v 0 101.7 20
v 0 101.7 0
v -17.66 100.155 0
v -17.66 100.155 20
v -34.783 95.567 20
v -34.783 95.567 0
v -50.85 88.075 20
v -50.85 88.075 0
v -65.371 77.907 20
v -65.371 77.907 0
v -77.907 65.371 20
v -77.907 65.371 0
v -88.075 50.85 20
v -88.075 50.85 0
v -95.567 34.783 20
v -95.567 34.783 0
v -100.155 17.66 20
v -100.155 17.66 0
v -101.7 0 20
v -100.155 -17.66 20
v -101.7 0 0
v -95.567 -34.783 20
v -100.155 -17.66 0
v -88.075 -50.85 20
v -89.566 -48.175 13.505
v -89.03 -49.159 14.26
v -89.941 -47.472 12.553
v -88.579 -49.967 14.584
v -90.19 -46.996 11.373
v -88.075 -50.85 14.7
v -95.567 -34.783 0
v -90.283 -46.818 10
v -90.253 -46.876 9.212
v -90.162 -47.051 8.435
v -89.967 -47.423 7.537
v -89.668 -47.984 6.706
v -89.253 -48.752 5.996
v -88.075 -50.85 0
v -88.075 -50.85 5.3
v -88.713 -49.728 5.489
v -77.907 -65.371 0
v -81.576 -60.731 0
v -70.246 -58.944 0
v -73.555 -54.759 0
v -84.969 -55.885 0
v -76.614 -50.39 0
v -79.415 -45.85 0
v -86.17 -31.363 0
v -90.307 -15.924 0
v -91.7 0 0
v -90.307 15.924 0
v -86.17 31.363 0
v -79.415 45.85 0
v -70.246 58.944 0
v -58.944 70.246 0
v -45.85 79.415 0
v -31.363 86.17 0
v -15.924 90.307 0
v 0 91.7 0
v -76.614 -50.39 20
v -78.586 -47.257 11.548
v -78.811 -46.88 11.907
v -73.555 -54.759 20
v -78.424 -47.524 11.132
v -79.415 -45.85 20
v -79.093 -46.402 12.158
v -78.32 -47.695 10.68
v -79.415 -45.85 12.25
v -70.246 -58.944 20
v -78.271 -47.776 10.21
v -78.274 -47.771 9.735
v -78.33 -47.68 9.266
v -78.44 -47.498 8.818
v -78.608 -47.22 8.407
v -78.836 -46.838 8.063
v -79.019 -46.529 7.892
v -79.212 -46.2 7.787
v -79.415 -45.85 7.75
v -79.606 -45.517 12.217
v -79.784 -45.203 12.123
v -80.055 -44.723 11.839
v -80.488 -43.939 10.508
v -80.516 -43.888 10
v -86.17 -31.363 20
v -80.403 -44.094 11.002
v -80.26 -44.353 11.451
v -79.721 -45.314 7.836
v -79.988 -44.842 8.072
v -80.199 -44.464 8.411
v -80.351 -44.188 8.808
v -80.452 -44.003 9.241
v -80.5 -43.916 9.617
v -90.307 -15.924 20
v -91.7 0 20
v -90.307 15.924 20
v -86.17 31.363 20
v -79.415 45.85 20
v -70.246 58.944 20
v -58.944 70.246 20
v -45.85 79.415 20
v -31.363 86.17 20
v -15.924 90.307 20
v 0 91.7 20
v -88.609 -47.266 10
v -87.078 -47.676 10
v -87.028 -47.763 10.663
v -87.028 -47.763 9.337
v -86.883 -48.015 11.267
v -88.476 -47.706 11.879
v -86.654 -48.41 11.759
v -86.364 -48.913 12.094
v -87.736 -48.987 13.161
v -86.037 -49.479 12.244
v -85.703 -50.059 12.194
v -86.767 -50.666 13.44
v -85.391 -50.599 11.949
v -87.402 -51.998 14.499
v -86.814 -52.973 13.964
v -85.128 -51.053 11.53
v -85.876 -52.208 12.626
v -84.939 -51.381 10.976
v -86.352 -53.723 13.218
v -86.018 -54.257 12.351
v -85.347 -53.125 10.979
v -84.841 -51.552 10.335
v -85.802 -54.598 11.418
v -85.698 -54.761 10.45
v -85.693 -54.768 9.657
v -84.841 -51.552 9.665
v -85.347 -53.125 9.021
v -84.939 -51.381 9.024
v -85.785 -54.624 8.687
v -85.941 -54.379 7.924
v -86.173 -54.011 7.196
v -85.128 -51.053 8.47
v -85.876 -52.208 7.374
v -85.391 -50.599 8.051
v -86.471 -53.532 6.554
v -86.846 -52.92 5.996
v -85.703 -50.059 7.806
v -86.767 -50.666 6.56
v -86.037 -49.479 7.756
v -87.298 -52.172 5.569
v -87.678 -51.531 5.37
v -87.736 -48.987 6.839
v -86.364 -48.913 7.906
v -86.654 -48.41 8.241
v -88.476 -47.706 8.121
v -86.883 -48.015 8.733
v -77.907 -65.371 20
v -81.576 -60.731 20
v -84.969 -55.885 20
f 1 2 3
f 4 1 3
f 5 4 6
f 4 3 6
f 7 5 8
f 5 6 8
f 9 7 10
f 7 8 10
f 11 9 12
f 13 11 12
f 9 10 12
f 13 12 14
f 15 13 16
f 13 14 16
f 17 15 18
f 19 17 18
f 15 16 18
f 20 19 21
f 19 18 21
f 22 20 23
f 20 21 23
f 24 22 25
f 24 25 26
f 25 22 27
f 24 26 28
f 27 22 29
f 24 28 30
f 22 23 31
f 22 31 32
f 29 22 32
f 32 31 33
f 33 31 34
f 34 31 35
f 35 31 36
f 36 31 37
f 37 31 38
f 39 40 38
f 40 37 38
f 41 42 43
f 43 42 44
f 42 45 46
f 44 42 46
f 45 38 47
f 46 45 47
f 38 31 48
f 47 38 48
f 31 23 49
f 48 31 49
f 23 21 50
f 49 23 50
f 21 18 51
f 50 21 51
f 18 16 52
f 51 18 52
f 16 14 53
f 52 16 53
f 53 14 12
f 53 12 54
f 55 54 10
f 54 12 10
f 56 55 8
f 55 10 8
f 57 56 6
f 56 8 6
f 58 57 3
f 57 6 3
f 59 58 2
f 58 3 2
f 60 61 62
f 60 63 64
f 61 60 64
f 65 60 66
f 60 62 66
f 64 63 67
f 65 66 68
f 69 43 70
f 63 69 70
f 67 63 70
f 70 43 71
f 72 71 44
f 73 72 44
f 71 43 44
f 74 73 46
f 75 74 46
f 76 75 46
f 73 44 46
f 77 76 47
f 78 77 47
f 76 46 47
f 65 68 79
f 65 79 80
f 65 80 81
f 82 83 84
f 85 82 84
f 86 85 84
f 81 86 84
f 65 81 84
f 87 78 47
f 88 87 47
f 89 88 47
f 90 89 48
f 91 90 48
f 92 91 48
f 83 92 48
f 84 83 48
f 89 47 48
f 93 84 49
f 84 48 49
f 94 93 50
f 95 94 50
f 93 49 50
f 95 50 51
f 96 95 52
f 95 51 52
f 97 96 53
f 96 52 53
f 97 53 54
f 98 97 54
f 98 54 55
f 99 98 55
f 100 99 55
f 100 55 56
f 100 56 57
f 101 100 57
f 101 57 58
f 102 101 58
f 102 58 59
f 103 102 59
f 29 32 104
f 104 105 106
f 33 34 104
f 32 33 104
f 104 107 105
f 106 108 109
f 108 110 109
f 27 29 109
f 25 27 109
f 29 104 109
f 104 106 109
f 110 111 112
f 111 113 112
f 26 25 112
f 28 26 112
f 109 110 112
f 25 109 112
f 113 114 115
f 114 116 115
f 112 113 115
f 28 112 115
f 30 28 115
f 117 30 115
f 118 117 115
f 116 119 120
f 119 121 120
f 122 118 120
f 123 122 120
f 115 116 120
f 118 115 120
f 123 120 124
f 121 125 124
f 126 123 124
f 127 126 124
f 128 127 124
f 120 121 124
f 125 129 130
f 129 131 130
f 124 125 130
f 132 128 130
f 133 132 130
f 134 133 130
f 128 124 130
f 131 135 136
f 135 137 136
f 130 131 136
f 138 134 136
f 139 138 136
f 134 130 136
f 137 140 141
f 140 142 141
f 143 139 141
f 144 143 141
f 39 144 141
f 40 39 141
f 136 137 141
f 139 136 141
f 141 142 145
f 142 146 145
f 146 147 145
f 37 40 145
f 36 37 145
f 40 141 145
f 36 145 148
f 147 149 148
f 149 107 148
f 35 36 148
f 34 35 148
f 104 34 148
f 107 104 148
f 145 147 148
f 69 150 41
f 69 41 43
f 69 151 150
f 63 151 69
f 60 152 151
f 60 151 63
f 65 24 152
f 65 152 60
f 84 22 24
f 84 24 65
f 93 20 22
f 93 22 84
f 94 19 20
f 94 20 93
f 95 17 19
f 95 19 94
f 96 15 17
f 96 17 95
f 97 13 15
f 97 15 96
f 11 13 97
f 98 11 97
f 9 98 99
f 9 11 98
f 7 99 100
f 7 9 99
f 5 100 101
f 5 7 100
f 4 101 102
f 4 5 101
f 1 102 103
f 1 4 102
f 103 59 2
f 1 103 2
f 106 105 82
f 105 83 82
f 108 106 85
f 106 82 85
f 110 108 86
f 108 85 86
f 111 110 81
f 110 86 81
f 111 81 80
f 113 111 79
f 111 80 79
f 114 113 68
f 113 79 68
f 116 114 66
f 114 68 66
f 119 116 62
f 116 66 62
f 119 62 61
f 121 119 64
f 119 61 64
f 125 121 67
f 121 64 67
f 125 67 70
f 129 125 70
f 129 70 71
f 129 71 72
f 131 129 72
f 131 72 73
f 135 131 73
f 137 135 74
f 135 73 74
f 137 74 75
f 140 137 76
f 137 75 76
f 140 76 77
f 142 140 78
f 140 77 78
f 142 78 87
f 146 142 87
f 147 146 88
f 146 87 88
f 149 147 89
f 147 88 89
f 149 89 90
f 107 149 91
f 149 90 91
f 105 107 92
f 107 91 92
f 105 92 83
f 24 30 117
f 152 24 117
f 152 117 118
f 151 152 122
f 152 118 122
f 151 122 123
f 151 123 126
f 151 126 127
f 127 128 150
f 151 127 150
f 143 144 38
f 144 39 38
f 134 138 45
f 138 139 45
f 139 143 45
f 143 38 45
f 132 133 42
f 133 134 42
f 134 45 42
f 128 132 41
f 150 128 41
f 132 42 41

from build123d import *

# Parameters (mm, degrees)
ESTRUSIONE_ESTRUSIONE1_DEPTH           = 20
FORO_SVASATO_PER_VITE_M4_1_D           = 4.5
FORO_SVASATO_PER_VITE_M4_1_DEPTH       = 30
FORO_SVASATO_PER_VITE_M4_1_CSINK_D     = 9.4
FORO_SVASATO_PER_VITE_M4_1_CSINK_ANGLE = 90
FORO_SVASATO_PER_VITE_M4_1_TIP         = 1.351936393


with BuildPart() as part:
    # Schizzo1 → Estrusione-Estrusione1 (new body)
    with BuildSketch(Plane.XY):
        with BuildLine():
            Line((-88.074783565, -50.85), (-79.414529527, -45.85))
            ThreePointArc((-79.414529527, -45.85), (-79.414529527, 45.85), (0, 91.7))
            Line((0, 91.7), (0, 101.7))
            ThreePointArc((0, 101.7), (-88.074783565, 50.85), (-88.074783565, -50.85))
        make_face()
        with BuildLine():
            Line((-77.906719865, -65.371499905), (-70.246275434, -58.943623808))
            ThreePointArc((-70.246275434, -58.943623808), (-75.116242461, -52.596959213), (-79.414529527, -45.85))
            Line((-79.414529527, -45.85), (-88.074783565, -50.85))
            ThreePointArc((-88.074783565, -50.85), (-83.307762904, -58.332723577), (-77.906719865, -65.371499905))
        make_face()
    extrude(amount=ESTRUSIONE_ESTRUSIONE1_DEPTH)

    # Foro svasato per Vite M4-1
    with Locations(Plane(origin=(-88.074783565, -50.85, 10), x_dir=(0.5, -0.866025403784, 0), z_dir=(-0.866025403784, -0.5, 0))):
        with Locations((0, 0)):
            CounterSinkHole(FORO_SVASATO_PER_VITE_M4_1_D / 2, FORO_SVASATO_PER_VITE_M4_1_CSINK_D / 2, depth=FORO_SVASATO_PER_VITE_M4_1_DEPTH, counter_sink_angle=FORO_SVASATO_PER_VITE_M4_1_CSINK_ANGLE)
            with Locations((0, 0, -(FORO_SVASATO_PER_VITE_M4_1_DEPTH + FORO_SVASATO_PER_VITE_M4_1_TIP / 2))):  # 118° drill point
                Cone(0, FORO_SVASATO_PER_VITE_M4_1_D / 2, FORO_SVASATO_PER_VITE_M4_1_TIP, mode=Mode.SUBTRACT)


solid = part.part
